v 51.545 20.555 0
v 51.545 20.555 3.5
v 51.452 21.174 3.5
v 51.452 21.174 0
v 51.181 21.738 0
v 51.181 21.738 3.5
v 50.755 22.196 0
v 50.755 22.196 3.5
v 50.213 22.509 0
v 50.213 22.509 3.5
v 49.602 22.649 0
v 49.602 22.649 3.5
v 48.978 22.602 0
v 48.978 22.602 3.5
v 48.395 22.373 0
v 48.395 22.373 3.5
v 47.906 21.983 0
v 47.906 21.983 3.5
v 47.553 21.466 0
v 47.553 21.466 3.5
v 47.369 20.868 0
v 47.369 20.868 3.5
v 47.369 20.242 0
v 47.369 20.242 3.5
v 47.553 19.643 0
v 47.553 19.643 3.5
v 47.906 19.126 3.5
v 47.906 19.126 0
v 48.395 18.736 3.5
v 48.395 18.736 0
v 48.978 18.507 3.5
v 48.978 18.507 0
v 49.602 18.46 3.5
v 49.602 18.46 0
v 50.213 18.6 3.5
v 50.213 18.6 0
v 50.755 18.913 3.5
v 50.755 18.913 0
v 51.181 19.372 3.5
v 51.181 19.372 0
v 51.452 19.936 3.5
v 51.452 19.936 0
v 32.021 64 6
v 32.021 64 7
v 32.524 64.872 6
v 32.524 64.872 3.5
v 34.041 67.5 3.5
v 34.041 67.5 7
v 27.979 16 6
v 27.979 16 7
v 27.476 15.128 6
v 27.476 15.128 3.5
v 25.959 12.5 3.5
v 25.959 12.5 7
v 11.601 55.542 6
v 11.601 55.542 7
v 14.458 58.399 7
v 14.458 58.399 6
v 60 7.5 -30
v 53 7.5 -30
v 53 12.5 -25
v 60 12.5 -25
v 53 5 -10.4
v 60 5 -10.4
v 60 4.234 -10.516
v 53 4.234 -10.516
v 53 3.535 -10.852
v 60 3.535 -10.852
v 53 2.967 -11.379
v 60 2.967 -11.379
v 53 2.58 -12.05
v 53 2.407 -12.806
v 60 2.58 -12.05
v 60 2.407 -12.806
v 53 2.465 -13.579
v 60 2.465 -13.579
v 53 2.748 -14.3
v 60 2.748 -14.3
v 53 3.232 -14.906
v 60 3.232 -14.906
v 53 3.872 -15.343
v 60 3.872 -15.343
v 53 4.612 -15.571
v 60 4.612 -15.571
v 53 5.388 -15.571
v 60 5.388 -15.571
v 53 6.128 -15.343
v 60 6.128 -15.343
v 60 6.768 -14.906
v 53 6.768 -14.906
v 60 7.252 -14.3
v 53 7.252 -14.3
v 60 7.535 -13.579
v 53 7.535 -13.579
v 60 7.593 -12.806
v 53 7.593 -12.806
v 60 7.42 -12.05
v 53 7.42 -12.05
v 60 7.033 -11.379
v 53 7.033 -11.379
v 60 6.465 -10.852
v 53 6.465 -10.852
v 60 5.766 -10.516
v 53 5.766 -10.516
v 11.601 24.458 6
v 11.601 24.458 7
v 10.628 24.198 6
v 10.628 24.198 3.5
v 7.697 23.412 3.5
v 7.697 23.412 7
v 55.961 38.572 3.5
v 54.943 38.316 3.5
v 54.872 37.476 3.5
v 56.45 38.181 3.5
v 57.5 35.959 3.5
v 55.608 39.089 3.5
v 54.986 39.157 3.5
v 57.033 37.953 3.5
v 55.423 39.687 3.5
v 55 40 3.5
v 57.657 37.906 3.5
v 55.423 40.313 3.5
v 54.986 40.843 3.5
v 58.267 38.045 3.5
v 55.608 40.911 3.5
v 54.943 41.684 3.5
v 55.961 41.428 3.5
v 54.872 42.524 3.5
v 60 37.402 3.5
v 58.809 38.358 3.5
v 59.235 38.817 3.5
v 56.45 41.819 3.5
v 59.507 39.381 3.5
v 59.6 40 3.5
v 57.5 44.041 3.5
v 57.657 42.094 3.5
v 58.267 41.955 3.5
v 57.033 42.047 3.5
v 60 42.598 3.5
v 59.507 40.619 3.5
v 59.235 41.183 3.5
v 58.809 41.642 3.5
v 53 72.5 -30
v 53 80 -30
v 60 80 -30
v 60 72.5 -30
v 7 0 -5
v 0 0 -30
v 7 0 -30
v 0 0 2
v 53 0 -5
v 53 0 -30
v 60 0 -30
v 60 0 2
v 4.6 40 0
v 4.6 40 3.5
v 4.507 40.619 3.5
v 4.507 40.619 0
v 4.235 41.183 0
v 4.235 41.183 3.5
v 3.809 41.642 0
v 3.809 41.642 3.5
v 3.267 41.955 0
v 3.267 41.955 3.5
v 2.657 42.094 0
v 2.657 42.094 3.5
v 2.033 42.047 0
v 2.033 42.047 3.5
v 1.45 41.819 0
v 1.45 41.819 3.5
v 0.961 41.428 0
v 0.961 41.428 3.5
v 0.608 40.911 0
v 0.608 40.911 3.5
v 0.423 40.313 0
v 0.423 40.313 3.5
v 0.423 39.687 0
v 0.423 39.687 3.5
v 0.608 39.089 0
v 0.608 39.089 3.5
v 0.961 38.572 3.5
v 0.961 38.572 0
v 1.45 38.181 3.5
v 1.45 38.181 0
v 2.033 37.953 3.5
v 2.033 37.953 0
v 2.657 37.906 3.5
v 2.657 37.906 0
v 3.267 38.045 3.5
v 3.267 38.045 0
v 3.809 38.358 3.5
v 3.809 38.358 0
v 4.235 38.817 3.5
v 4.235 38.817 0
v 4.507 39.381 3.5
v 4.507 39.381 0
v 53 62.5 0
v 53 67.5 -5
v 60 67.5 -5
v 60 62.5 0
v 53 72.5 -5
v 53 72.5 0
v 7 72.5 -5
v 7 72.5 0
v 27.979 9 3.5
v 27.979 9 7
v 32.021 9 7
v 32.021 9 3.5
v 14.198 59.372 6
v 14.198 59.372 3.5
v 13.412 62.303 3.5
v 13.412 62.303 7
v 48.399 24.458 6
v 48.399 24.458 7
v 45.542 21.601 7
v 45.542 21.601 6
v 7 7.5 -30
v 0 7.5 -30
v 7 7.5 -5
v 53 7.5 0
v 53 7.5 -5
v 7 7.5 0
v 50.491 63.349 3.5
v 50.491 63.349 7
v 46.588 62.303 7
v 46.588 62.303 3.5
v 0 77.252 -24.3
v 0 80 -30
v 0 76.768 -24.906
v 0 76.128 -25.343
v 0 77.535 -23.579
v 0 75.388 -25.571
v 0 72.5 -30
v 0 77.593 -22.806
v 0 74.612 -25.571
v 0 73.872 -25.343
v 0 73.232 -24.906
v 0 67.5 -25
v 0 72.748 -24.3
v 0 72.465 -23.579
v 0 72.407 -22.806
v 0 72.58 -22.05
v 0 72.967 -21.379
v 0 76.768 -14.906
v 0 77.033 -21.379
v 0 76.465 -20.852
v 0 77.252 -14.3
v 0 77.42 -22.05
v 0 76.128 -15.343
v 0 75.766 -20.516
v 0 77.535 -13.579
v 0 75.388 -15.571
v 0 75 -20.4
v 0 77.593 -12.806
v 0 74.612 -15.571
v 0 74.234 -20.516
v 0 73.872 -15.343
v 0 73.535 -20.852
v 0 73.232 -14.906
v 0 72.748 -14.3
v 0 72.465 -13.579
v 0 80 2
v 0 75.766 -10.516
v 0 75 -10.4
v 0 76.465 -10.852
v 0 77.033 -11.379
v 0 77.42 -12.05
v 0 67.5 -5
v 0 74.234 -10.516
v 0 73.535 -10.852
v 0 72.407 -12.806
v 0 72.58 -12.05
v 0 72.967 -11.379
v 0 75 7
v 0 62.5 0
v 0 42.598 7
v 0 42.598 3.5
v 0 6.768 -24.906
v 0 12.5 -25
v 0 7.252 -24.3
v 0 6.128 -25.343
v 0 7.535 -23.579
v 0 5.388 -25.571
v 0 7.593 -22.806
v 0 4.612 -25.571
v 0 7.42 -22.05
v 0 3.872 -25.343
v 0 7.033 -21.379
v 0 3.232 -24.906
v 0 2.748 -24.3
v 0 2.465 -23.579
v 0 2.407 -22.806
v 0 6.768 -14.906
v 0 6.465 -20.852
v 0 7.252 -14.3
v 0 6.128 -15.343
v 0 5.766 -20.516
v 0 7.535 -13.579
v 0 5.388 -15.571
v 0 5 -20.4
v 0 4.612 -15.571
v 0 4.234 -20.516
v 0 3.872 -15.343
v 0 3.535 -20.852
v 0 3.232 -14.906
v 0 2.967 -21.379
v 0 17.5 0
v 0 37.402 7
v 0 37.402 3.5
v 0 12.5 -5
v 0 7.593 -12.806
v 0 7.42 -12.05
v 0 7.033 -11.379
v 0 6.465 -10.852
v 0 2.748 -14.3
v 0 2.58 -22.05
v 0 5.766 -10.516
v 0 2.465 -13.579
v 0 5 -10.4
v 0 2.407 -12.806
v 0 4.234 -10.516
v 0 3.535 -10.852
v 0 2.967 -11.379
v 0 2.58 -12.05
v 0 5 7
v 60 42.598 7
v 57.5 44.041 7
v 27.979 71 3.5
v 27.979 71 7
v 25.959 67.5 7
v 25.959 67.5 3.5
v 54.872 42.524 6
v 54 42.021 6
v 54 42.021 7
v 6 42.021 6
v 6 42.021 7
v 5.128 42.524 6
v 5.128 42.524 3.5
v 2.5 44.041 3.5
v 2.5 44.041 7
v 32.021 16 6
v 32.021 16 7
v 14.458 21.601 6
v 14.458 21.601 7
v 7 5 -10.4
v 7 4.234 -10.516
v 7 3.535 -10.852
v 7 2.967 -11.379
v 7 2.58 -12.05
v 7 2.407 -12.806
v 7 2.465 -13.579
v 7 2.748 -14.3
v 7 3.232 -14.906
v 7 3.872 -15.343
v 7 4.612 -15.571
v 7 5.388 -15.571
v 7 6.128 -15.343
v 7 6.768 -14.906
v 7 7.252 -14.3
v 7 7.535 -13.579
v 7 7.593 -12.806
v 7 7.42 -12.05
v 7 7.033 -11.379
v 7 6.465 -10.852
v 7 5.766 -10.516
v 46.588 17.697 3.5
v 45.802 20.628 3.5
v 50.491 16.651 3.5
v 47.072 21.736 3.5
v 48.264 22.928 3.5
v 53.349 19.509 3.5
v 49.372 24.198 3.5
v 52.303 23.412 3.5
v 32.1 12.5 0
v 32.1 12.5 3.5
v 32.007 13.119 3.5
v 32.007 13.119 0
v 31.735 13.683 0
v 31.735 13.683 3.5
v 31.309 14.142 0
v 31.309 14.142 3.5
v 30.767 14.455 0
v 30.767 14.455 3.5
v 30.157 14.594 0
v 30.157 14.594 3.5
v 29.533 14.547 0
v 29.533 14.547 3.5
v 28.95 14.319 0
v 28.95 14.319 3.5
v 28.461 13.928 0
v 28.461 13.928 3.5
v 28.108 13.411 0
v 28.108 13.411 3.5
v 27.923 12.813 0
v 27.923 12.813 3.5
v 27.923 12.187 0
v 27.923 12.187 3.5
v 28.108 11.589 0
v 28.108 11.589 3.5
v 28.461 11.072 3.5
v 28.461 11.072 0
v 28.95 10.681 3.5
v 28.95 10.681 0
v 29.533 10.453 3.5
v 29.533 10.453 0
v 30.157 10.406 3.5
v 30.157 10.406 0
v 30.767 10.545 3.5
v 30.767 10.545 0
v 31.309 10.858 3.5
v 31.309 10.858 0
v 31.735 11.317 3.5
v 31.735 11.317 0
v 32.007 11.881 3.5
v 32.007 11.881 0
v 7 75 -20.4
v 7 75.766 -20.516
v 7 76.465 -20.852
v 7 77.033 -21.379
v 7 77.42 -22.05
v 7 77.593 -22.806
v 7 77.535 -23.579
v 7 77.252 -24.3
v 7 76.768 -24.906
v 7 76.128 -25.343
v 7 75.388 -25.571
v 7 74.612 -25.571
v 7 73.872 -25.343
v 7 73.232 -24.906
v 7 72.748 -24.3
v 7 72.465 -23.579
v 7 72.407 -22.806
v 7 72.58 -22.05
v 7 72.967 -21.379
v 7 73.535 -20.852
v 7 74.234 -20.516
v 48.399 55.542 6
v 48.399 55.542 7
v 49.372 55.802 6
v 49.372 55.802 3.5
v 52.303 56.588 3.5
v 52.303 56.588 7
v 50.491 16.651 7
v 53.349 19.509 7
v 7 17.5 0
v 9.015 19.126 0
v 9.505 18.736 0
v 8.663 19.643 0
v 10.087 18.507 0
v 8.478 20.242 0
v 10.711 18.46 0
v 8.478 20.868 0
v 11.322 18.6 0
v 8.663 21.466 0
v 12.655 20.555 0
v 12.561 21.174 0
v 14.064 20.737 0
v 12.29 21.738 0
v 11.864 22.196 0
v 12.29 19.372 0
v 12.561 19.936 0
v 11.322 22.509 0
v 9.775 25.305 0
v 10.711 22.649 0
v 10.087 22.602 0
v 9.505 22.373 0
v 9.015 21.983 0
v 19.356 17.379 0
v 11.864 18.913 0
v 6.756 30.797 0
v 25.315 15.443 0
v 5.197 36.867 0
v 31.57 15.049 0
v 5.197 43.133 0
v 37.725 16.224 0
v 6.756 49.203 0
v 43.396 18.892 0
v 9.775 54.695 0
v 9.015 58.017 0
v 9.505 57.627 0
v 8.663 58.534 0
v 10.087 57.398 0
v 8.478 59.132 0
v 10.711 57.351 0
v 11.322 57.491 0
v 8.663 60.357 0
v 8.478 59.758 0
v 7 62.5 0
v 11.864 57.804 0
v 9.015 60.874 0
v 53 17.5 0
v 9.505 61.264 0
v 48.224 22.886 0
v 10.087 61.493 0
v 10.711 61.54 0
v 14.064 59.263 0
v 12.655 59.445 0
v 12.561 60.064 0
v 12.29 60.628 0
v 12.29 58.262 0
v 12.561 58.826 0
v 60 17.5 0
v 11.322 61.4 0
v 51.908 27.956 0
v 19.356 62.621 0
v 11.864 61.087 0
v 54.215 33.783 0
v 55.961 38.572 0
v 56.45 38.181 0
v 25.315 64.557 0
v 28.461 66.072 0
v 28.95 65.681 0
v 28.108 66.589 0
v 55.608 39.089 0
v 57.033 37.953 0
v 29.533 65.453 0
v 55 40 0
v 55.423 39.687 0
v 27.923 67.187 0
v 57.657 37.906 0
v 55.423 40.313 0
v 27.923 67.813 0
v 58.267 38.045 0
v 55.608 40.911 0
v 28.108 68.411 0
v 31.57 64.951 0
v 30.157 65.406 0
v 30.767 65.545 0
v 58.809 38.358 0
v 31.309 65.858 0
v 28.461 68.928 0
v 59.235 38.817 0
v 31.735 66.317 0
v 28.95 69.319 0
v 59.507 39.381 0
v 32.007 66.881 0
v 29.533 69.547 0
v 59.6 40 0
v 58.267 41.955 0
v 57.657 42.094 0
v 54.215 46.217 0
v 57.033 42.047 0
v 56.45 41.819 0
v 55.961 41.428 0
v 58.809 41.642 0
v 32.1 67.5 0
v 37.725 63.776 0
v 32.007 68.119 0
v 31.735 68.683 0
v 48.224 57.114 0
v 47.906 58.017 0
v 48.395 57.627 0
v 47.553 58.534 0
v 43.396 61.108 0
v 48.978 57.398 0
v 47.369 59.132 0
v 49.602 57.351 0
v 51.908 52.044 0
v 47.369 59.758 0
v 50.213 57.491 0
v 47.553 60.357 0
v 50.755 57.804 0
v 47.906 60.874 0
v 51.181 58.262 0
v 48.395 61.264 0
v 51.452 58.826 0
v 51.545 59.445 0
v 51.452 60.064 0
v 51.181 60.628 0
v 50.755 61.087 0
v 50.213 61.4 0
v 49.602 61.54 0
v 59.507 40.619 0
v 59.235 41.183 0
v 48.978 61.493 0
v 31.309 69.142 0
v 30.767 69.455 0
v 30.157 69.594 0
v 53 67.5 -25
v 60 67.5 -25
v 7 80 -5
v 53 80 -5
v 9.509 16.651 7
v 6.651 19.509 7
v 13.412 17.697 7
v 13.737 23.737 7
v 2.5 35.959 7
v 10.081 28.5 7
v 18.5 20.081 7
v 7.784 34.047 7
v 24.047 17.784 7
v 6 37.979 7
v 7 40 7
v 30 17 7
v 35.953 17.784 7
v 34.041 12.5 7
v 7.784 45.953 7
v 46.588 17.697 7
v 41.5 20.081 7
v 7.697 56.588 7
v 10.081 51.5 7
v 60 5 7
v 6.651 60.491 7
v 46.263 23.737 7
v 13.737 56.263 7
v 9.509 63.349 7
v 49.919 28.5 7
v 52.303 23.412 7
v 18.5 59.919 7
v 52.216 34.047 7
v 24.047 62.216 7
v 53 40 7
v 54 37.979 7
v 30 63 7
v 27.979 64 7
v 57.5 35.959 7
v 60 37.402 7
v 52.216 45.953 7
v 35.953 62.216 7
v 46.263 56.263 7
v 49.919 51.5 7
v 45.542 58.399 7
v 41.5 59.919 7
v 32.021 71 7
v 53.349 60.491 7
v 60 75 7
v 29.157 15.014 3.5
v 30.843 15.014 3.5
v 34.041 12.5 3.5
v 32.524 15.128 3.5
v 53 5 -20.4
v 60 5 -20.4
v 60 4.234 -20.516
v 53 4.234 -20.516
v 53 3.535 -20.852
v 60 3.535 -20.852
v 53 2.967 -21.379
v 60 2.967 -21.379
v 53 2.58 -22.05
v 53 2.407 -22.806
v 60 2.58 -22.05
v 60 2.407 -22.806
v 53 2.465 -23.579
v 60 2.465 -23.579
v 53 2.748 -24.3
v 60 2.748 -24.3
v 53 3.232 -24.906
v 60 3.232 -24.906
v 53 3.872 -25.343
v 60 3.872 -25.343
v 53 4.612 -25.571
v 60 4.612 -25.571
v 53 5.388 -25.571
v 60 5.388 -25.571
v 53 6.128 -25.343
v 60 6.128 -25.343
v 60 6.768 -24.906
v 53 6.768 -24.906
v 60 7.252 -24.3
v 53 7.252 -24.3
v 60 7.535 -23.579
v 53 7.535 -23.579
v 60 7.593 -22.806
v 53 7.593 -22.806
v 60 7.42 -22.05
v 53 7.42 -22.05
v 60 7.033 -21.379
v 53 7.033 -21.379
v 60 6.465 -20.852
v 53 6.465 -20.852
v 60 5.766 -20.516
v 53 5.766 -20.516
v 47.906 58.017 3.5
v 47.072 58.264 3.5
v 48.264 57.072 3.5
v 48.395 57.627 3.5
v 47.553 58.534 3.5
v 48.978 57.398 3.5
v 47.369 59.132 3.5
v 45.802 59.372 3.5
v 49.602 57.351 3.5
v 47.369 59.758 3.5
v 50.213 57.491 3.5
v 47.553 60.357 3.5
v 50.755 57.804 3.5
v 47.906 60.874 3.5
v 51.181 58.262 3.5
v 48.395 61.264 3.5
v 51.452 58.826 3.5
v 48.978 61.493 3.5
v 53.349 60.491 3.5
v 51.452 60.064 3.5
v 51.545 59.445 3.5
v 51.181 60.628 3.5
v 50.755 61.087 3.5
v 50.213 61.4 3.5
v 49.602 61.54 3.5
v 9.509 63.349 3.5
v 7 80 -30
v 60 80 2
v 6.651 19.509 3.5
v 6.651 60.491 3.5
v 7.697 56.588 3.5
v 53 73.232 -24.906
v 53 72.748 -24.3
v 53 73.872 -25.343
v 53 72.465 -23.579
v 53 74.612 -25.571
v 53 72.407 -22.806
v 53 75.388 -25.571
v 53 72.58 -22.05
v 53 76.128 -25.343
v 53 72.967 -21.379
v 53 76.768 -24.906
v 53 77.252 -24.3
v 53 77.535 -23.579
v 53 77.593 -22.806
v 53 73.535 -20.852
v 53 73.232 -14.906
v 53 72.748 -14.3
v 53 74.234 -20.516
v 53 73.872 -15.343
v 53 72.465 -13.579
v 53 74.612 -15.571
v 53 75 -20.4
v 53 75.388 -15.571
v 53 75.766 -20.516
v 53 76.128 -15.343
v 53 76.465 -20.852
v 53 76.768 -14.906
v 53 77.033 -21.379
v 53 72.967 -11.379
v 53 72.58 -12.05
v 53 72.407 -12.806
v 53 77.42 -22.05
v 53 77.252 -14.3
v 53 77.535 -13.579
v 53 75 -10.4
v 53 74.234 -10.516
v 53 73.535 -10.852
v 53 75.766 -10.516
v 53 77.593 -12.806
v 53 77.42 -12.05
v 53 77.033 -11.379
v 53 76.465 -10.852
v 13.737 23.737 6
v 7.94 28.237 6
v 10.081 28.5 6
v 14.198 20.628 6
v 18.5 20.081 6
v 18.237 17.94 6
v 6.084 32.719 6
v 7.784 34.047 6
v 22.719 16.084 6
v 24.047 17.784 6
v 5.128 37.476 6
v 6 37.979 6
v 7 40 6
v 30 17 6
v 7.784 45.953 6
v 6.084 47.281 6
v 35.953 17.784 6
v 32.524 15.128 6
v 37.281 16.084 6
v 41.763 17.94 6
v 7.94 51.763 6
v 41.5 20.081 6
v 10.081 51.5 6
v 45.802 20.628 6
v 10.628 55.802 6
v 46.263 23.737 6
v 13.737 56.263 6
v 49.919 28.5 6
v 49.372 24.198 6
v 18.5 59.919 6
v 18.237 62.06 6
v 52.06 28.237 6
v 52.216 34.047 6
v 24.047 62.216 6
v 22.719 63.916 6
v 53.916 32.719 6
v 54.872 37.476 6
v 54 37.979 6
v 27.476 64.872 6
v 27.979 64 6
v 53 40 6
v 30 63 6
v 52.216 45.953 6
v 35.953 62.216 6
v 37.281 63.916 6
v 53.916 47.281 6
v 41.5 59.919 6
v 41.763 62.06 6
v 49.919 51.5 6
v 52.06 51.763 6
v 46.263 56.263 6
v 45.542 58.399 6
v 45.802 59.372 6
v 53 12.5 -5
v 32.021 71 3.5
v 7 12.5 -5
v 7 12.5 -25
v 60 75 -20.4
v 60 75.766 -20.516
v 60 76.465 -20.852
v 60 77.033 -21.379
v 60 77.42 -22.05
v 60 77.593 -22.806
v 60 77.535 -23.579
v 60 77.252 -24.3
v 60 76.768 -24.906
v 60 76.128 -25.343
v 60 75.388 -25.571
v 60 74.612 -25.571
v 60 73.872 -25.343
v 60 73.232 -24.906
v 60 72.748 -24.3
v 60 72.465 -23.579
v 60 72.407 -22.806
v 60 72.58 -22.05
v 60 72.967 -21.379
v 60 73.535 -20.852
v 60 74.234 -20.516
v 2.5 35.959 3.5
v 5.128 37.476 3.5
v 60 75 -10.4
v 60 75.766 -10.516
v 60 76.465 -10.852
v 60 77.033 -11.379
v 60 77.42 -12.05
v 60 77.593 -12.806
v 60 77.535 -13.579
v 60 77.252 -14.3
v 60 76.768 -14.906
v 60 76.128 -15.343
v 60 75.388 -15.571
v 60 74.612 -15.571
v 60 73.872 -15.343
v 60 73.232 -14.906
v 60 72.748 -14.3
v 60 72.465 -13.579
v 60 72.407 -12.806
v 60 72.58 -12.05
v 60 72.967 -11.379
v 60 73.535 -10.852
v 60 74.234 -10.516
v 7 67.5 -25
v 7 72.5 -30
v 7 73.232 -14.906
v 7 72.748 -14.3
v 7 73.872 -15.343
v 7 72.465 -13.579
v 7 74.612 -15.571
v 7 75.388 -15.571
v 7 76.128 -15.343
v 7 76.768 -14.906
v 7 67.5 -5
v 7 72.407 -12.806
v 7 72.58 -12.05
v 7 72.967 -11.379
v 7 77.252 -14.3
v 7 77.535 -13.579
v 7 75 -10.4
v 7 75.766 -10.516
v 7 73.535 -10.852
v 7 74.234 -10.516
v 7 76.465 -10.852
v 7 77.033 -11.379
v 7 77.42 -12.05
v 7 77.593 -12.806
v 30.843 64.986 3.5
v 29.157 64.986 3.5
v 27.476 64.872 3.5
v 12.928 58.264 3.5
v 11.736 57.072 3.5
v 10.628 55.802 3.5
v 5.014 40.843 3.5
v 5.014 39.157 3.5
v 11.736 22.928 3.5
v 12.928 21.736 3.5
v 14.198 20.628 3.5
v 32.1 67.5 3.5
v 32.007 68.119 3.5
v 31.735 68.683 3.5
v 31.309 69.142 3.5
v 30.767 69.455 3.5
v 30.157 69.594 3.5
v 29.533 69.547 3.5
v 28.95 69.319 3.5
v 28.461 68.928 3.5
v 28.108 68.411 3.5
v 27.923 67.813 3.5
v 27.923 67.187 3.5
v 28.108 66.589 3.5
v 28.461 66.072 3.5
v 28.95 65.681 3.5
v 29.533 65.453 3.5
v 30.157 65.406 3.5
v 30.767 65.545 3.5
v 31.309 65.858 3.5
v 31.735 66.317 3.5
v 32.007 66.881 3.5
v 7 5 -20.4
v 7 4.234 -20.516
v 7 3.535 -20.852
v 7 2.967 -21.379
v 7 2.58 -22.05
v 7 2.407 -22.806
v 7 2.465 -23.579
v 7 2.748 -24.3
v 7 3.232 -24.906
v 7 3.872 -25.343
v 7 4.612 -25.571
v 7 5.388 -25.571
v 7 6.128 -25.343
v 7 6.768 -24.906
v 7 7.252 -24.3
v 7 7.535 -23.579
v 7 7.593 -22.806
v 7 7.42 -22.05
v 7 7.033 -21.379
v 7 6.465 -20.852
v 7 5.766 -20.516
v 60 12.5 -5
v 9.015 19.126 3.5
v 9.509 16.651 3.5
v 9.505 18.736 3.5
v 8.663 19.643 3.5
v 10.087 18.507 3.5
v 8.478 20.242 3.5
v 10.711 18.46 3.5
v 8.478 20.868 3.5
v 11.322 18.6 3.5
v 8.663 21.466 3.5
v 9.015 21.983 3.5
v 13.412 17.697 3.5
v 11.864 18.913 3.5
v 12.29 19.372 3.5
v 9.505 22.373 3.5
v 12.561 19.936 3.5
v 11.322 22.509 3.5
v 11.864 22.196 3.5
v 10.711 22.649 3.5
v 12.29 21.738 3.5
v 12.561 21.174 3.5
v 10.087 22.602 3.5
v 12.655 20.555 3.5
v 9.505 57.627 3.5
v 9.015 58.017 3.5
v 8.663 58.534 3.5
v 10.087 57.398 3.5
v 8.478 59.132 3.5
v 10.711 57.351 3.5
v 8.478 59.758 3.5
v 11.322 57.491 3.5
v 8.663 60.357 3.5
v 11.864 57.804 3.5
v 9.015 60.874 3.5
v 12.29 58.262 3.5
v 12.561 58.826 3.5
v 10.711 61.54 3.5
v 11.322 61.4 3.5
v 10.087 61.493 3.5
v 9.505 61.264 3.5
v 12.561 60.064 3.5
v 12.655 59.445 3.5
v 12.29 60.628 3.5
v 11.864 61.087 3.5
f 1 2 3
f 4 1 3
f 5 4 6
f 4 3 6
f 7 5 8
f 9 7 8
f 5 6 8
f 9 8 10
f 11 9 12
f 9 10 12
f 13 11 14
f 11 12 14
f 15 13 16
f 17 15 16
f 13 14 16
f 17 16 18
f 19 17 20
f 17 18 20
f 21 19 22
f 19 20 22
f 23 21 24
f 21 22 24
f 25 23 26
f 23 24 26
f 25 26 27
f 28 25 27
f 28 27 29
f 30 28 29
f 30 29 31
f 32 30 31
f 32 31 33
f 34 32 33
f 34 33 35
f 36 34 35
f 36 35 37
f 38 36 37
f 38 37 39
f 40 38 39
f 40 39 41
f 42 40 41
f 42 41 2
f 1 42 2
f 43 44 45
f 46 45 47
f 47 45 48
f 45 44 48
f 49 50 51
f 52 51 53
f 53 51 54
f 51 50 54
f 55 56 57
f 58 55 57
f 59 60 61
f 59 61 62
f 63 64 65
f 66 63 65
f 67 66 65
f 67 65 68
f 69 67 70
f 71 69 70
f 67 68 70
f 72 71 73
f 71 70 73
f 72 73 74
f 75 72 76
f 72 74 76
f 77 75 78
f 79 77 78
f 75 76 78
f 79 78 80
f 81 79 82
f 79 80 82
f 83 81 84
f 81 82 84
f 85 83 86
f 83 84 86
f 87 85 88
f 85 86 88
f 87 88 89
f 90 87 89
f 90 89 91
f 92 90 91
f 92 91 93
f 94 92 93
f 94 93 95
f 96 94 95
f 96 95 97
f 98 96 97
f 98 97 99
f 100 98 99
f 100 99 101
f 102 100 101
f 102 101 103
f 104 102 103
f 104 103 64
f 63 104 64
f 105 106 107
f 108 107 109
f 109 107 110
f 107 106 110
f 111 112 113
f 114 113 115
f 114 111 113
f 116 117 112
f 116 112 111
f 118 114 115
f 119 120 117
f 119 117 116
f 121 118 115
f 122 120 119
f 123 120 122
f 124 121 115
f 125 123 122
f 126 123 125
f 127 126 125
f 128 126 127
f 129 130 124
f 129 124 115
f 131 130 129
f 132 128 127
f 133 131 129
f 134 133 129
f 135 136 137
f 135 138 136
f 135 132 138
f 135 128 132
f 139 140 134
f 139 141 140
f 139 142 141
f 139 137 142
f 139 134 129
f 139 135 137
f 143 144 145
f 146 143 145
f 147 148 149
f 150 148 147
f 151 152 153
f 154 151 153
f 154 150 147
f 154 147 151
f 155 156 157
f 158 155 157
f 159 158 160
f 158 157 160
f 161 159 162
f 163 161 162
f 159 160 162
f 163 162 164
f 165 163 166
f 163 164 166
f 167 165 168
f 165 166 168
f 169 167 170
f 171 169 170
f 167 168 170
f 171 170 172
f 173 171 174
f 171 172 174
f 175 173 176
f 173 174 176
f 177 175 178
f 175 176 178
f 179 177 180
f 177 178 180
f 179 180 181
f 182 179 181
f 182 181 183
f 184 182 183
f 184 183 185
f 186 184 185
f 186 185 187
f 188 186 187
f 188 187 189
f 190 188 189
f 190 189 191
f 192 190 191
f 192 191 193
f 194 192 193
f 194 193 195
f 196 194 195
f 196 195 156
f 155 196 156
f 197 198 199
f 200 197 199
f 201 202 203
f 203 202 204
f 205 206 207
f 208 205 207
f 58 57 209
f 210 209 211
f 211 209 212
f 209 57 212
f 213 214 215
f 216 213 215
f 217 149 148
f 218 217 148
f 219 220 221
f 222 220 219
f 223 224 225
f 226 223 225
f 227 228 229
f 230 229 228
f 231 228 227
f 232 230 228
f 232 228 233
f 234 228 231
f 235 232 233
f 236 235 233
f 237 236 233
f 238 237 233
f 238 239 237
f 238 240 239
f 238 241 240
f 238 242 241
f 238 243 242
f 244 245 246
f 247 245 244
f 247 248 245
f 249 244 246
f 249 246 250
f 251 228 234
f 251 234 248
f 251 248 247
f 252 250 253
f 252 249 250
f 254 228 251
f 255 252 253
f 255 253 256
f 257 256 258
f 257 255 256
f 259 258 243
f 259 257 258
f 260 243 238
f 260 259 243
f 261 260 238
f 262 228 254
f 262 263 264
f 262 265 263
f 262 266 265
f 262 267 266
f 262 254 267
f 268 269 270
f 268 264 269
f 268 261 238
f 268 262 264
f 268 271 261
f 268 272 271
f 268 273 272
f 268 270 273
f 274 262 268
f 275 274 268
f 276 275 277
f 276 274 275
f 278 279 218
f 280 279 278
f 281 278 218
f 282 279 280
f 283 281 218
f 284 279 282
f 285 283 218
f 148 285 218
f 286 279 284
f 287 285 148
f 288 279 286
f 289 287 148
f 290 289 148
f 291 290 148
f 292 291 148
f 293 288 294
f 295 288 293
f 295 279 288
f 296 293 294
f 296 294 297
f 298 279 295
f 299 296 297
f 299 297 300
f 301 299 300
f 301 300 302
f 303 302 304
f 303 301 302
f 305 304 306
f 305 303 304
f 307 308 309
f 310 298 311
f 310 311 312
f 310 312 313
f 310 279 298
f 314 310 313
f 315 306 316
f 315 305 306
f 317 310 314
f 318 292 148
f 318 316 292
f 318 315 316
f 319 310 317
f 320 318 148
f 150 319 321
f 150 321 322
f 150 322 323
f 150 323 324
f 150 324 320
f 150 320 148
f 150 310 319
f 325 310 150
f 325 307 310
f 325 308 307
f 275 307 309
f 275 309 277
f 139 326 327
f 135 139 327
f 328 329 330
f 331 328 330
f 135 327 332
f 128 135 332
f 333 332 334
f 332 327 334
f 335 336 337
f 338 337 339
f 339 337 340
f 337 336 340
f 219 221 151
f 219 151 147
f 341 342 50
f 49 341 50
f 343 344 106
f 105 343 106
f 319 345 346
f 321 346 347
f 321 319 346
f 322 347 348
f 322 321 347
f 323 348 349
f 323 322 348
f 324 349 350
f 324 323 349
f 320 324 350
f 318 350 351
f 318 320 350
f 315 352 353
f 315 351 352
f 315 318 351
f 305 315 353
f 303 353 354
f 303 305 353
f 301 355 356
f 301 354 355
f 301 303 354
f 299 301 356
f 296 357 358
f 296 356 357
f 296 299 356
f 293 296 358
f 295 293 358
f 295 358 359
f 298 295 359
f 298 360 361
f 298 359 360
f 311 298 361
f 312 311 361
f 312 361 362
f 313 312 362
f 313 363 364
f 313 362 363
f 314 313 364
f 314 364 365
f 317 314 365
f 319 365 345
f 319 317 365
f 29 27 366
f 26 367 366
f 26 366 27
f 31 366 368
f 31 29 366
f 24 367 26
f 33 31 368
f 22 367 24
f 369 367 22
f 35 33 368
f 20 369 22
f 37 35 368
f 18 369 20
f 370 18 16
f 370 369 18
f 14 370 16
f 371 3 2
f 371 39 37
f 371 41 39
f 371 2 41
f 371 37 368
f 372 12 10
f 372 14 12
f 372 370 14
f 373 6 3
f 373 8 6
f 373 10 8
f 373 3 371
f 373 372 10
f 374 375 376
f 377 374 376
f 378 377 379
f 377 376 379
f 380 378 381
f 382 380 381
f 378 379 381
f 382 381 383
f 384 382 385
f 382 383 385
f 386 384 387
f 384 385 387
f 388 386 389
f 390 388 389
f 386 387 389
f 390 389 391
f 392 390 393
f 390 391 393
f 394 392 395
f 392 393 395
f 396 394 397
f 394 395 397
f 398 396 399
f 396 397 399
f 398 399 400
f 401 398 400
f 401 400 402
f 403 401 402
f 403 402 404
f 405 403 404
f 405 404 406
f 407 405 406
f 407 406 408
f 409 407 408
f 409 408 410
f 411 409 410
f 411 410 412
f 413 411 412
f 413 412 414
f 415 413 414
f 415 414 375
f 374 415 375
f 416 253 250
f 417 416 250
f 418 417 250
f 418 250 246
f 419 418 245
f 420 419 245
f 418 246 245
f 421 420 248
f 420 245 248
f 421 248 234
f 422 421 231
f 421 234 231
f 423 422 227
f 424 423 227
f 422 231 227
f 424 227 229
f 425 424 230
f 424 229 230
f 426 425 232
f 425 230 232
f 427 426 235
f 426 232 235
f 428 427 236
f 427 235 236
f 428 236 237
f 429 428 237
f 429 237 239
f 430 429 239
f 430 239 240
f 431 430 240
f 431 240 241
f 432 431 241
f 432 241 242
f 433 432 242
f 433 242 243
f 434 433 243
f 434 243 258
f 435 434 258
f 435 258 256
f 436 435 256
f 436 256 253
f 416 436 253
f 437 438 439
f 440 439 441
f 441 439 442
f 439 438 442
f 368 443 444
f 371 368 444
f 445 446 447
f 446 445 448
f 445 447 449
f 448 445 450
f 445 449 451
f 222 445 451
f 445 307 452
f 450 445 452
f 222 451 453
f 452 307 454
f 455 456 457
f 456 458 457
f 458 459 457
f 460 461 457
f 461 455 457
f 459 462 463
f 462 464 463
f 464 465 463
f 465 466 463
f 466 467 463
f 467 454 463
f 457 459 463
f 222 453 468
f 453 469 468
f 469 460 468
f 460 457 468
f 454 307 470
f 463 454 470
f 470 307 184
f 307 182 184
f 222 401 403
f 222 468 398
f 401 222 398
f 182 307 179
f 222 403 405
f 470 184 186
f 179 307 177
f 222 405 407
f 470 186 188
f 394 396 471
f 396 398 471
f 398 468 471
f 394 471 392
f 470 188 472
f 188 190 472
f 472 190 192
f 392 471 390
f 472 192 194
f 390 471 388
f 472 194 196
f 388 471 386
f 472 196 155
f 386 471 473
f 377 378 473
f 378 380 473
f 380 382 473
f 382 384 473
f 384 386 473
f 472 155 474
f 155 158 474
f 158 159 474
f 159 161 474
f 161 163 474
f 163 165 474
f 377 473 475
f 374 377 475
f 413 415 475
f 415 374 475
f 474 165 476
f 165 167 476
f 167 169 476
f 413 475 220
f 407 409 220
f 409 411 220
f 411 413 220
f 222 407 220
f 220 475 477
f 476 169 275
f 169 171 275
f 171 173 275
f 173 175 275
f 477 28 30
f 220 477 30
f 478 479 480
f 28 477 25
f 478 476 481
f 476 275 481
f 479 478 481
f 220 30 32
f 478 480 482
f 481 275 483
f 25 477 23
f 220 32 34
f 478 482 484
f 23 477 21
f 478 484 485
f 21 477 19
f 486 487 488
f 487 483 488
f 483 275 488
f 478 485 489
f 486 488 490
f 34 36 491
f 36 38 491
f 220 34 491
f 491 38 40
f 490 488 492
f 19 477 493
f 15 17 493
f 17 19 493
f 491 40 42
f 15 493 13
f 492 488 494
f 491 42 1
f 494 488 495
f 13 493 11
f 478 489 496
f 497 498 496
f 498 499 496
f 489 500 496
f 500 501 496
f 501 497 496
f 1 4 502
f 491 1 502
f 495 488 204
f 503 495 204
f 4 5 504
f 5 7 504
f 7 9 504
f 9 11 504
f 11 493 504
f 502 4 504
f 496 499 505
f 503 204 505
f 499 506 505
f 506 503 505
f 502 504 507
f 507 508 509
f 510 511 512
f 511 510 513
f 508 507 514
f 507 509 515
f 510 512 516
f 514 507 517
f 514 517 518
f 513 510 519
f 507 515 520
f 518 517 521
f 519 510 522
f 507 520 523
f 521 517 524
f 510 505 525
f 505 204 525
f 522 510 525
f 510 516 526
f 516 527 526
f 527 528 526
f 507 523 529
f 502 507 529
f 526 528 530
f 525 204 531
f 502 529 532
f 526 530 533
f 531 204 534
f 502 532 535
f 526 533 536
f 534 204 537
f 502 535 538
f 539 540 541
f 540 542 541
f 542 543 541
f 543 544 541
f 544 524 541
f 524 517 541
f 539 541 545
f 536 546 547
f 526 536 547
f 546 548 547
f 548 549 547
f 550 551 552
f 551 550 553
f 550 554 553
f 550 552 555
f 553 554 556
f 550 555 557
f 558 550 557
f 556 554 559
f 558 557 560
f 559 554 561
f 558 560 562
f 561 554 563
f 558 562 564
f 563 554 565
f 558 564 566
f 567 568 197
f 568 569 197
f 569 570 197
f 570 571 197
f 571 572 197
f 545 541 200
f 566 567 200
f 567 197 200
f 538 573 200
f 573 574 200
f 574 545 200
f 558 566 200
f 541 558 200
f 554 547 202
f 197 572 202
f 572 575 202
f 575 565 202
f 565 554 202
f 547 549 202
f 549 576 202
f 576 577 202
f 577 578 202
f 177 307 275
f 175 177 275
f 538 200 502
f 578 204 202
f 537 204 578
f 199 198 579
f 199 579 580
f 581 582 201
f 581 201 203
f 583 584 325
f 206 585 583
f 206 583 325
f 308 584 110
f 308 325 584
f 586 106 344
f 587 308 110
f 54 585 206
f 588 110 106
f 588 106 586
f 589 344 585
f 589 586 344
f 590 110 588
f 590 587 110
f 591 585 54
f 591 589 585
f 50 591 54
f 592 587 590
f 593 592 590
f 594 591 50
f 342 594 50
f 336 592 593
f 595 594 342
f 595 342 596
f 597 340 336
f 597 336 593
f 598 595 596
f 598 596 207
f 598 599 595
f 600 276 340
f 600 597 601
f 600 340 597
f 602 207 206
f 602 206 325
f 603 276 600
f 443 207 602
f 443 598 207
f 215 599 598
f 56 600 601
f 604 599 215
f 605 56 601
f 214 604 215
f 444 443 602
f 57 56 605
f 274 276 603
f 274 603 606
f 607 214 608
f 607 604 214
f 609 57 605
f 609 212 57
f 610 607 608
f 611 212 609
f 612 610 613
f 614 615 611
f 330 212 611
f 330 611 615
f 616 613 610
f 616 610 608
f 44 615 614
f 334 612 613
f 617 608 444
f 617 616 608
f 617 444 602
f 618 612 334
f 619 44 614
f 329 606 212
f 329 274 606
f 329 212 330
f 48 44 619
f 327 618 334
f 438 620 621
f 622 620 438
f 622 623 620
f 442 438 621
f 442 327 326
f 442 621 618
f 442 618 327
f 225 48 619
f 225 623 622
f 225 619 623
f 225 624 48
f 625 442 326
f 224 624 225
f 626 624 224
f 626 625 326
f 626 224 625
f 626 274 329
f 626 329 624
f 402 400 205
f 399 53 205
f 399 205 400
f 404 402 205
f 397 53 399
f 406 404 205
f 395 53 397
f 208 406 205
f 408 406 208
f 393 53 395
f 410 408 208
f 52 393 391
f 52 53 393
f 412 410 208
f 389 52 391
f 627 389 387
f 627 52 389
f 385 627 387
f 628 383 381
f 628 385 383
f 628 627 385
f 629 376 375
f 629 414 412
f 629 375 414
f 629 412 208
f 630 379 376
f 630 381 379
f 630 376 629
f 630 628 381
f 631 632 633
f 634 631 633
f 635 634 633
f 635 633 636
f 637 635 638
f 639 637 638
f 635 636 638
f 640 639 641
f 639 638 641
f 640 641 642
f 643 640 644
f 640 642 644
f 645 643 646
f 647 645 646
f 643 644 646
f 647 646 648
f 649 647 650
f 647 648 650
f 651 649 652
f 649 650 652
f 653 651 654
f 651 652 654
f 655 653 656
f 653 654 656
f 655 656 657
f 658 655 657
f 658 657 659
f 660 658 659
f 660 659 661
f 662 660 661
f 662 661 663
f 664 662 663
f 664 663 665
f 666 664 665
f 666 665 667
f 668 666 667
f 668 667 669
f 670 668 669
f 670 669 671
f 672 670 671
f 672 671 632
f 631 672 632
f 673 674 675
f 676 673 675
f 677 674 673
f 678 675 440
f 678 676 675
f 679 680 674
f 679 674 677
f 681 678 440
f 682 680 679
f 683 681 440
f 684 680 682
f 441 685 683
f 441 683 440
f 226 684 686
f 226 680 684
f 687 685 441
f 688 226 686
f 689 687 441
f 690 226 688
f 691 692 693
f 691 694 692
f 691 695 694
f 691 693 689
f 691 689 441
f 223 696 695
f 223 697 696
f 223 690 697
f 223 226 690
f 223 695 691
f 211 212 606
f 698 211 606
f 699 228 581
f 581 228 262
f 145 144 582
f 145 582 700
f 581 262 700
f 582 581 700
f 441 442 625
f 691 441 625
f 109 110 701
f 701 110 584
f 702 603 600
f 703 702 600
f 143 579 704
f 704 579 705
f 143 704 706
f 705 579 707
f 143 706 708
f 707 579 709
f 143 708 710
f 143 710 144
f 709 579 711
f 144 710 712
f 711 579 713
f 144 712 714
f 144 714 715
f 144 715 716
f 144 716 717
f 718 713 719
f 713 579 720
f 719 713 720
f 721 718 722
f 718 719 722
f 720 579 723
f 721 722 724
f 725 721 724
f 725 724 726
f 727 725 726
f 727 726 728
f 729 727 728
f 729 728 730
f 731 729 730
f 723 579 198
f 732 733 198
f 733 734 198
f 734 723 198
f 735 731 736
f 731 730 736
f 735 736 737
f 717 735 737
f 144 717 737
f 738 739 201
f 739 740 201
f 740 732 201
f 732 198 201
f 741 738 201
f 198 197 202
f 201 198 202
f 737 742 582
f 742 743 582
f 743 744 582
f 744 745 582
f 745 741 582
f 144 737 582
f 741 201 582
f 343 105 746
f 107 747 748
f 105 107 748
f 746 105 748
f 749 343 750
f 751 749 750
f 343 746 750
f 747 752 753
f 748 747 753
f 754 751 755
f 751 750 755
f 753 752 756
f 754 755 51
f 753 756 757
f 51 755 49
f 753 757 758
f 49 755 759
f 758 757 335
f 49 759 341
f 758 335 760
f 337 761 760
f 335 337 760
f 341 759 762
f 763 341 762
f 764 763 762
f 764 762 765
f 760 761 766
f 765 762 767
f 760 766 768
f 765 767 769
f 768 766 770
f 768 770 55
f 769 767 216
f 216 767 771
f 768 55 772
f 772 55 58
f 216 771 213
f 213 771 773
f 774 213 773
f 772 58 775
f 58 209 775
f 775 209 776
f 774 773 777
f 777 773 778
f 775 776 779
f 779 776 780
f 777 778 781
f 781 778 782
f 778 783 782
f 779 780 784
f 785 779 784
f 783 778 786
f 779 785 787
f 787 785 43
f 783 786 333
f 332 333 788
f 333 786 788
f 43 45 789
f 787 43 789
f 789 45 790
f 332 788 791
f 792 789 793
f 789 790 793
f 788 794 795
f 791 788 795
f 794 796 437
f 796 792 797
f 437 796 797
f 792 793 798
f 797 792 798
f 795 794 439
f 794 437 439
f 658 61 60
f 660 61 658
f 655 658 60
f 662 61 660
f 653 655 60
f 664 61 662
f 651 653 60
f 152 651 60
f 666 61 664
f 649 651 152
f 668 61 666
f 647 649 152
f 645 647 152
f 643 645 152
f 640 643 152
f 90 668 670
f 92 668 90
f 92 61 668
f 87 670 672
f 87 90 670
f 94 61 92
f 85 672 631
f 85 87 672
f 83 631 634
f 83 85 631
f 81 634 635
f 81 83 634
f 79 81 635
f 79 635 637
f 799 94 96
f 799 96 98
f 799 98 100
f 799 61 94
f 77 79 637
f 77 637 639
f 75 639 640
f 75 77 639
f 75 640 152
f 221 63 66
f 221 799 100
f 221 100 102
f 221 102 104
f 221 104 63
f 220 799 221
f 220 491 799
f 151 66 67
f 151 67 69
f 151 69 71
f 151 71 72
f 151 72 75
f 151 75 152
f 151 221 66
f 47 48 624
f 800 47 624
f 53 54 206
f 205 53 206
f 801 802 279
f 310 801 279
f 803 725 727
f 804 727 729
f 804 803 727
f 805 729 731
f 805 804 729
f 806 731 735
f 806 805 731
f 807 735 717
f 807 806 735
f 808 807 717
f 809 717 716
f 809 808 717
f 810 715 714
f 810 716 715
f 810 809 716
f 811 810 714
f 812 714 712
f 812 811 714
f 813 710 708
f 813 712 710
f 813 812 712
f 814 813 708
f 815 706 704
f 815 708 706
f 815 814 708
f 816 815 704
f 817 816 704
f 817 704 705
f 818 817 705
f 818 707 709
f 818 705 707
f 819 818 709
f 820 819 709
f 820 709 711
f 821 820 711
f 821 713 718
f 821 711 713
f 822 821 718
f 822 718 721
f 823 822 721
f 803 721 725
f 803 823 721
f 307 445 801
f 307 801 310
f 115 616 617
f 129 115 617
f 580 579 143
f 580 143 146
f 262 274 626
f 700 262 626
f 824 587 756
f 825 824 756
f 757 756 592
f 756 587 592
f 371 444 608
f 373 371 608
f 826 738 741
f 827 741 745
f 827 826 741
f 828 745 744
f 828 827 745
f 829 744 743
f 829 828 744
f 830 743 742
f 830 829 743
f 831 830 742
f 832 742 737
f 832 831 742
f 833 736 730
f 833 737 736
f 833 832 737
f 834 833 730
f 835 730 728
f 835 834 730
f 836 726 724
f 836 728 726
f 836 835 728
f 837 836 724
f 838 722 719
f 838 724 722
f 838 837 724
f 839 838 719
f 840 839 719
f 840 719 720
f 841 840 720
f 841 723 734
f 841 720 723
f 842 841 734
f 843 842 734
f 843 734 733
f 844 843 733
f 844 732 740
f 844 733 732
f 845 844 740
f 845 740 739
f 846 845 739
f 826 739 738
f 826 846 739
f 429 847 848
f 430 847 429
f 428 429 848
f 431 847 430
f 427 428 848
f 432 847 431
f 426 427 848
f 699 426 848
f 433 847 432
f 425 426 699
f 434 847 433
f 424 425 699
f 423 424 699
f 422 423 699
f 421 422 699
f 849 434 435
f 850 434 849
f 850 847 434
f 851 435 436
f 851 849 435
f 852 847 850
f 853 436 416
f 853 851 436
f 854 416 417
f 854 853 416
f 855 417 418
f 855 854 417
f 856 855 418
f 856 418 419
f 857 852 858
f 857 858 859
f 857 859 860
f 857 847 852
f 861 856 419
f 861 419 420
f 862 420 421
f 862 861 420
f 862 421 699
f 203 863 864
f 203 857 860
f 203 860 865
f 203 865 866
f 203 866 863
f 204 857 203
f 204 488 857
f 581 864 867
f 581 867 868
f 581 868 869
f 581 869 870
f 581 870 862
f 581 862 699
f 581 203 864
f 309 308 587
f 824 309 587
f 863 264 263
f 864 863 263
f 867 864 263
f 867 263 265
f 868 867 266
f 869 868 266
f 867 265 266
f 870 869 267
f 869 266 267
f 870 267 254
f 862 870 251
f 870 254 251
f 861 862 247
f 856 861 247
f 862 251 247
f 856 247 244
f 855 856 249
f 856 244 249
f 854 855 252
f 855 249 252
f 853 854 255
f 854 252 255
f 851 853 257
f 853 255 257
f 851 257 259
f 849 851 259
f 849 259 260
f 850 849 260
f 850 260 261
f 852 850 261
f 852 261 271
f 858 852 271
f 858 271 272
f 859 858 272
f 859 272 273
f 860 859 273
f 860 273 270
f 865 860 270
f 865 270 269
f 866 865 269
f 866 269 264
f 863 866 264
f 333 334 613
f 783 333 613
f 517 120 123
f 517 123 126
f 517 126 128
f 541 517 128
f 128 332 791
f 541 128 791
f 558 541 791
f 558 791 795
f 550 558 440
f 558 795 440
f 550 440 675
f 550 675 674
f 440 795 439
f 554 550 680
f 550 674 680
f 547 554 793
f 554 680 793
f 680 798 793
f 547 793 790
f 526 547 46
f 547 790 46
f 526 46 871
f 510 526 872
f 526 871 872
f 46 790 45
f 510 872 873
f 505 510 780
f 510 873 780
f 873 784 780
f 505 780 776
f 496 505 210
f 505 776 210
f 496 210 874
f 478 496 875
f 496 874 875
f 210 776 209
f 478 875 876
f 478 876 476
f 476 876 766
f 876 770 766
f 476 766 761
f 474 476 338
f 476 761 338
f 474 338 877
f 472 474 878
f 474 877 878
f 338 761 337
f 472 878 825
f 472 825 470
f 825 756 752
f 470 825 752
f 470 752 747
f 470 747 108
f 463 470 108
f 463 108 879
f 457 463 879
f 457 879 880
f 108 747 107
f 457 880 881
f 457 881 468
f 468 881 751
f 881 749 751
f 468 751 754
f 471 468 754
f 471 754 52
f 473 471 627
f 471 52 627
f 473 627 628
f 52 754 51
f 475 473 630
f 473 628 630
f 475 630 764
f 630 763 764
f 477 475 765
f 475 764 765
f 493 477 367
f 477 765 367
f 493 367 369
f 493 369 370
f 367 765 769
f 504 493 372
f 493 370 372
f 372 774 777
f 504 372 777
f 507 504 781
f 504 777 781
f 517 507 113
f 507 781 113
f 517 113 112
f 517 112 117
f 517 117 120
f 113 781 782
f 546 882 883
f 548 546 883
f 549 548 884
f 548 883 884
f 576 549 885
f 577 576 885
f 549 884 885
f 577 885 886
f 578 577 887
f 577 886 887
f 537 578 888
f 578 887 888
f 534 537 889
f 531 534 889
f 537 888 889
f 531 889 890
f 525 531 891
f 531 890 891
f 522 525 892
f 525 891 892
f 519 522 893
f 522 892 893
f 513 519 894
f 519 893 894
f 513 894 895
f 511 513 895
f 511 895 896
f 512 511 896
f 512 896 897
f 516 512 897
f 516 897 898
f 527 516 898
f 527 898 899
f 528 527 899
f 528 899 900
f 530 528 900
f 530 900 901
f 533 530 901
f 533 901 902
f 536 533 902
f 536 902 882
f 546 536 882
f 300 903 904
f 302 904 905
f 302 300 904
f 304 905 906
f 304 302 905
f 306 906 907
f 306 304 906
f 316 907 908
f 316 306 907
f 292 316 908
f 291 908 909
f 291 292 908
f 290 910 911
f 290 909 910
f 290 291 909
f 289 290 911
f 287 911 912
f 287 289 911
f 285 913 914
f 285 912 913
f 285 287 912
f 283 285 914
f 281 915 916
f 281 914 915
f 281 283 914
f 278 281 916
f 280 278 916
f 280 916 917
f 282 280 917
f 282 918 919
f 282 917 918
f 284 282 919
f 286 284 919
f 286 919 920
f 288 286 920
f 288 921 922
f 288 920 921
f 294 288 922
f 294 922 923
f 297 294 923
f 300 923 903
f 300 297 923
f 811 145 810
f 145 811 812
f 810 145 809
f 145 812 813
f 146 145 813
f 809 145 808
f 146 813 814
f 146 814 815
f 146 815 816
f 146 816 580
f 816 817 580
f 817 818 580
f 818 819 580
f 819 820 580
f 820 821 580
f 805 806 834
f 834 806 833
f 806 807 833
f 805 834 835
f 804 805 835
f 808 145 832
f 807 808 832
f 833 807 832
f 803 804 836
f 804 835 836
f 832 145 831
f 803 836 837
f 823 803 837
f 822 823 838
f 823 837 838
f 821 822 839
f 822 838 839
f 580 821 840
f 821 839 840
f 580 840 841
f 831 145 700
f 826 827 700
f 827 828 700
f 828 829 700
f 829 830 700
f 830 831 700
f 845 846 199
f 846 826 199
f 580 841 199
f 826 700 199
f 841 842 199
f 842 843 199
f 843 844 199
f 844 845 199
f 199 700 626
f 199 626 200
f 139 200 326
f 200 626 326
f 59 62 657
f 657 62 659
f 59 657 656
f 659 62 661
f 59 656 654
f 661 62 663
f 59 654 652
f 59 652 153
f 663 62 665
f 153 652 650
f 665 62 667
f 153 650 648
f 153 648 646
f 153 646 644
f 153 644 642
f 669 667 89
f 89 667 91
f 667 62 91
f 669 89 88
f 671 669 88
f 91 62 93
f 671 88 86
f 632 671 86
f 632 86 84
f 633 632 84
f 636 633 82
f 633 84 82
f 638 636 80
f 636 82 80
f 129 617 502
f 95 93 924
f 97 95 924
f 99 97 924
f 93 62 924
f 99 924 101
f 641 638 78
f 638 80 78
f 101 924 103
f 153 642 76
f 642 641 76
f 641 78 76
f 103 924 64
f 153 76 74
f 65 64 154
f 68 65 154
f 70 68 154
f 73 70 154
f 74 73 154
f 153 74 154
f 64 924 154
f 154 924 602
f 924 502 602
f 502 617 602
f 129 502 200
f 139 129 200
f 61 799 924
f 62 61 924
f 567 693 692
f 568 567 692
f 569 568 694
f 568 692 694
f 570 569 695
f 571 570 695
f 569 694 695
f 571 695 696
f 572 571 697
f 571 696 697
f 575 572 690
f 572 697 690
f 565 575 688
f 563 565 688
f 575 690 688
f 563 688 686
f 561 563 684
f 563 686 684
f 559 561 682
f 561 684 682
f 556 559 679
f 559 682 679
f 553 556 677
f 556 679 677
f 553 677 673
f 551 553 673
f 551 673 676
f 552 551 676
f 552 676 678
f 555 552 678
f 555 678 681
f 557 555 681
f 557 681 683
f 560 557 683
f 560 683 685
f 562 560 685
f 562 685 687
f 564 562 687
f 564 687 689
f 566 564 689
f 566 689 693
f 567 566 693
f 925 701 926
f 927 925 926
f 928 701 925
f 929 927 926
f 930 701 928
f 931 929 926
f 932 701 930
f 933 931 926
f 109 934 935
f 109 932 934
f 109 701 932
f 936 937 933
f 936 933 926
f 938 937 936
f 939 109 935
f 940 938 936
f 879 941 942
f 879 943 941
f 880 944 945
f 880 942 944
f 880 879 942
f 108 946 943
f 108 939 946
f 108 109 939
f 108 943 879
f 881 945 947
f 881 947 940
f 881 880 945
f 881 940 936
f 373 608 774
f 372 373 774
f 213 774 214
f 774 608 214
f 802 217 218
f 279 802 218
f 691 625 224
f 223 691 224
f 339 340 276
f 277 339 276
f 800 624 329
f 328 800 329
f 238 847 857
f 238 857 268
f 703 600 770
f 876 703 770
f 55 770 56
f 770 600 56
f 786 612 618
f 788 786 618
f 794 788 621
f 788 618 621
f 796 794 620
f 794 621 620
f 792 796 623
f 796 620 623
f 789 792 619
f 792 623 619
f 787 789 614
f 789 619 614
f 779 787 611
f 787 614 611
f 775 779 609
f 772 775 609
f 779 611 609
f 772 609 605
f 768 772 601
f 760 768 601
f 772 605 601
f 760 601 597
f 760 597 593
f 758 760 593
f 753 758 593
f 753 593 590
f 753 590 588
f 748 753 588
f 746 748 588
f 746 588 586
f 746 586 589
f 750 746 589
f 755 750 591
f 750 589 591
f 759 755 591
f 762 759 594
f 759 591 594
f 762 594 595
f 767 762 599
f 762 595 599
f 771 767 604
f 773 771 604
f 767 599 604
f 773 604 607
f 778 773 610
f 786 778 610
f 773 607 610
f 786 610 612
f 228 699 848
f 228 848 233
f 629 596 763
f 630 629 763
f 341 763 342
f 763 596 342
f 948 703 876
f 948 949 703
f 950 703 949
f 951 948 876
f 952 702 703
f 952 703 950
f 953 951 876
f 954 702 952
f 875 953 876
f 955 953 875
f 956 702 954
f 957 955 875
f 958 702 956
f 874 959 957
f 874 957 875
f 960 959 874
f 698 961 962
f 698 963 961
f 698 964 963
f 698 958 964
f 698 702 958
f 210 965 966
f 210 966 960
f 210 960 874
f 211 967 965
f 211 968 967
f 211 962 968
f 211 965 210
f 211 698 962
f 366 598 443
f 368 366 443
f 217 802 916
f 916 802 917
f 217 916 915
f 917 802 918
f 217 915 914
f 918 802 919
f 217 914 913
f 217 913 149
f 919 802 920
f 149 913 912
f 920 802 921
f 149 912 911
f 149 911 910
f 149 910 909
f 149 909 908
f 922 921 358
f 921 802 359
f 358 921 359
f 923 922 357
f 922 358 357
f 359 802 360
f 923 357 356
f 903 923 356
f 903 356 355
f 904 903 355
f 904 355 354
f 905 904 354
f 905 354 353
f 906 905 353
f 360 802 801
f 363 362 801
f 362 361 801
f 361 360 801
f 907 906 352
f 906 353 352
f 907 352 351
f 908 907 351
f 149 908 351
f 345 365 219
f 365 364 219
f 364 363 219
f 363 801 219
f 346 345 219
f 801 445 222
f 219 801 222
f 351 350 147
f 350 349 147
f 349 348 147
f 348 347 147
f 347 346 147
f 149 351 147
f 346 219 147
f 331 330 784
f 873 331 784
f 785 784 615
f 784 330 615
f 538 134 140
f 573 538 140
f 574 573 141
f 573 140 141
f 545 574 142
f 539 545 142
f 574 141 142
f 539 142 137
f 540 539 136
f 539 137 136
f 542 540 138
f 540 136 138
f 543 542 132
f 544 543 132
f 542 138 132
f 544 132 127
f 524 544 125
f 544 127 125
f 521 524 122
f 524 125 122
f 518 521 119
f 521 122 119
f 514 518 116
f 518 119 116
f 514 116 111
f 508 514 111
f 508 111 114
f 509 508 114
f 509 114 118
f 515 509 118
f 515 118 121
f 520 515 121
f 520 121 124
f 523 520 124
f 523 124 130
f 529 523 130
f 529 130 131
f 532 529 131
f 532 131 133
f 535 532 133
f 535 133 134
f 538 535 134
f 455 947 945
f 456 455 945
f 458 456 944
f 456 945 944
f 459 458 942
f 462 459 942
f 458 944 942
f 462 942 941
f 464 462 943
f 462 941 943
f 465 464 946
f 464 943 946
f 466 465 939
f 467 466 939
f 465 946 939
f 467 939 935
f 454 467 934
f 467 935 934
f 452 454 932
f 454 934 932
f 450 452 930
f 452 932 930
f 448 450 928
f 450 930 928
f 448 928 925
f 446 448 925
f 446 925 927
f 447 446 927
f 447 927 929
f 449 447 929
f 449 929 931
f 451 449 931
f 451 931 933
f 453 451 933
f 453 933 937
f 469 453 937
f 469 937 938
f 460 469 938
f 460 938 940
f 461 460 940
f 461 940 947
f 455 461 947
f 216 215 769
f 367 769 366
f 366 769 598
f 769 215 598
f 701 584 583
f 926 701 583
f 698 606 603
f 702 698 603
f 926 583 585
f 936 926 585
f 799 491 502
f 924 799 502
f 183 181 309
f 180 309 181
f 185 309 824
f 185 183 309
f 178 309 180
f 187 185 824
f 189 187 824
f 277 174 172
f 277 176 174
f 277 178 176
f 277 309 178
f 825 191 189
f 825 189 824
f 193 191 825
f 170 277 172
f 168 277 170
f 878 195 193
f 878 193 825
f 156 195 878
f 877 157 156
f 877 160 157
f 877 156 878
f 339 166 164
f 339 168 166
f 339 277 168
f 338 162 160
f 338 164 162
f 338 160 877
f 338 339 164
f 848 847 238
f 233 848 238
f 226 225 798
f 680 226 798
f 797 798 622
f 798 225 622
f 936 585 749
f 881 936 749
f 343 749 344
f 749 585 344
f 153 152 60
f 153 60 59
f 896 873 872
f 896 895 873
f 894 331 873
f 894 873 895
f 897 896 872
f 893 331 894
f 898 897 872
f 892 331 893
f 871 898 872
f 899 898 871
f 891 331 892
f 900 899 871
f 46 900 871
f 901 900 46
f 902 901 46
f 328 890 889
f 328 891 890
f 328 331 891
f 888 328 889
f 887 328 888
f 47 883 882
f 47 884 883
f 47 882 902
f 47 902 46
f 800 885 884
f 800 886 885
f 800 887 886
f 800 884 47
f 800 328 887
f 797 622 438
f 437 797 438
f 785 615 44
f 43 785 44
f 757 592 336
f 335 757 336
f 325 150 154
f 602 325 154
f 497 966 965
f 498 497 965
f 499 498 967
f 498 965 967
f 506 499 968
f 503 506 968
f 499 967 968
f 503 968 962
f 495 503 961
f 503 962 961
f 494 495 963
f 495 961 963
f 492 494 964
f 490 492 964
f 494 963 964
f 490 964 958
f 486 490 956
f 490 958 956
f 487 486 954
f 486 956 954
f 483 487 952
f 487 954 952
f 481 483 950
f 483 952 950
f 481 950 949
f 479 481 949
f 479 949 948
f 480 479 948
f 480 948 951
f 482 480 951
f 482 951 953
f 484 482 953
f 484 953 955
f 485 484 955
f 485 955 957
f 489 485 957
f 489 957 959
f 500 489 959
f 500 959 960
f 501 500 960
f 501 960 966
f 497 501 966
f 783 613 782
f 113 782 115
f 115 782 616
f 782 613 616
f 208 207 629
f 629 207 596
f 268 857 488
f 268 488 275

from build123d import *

# Parameters (mm, degrees)
SKETCH1_W               = 60
SKETCH1_H               = 80
BOSS_EXTRUDE1_DEPTH     = 7
SKETCH2_W               = 7
SKETCH2_H               = 12.5
BOSS_EXTRUDE2_DEPTH     = 30
SKETCH3_R               = 2.6
CUT_EXTRUDE1_DEPTH      = 50
SKETCH4_R               = 25
CUT_EXTRUDE2_DEPTH      = 107.625512894
SKETCH6_R               = 2.1
CUT_EXTRUDE3_DEPTH      = 107.625512894
MIRROR2_COPY_1_SKETCH_W = 7
MIRROR2_COPY_1_SKETCH_H = 12.5
MIRROR2_COPY_1_DEPTH    = 30
MIRROR2_COPY_2_SKETCH_R = 2.6
MIRROR2_COPY_2_DEPTH    = 50
CHAMFER1_SIZE           = 5
CHAMFER2_SIZE           = 5
SKETCH9_W               = 46
SKETCH9_H               = 7.5
BOSS_EXTRUDE4_DEPTH     = 5
CHAMFER3_SIZE           = 5
SKETCH20_R              = 25
SKETCH20_R_2            = 23
BOSS_EXTRUDE5_DEPTH     = 1
CUT_EXTRUDE5_DEPTH      = 3.5


with BuildPart() as part:
    # Sketch1 → Boss-Extrude1 (new body)
    with BuildSketch(Plane.XY):
        with Locations((30, 40)):
            Rectangle(SKETCH1_W, SKETCH1_H)
    extrude(amount=BOSS_EXTRUDE1_DEPTH)

    # Sketch2 → Boss-Extrude2 (add)
    with BuildSketch(Plane(origin=(0, 0, 0), x_dir=(-1, 0, 0), z_dir=(0, 0, -1))):
        with Locations((-3.5, 73.75)):
            Rectangle(SKETCH2_W, SKETCH2_H)
    boss_extrude2 = extrude(amount=BOSS_EXTRUDE2_DEPTH)

    # Sketch3 → Cut-Extrude1 (cut)
    with BuildSketch(Plane.ZY):
        with Locations((-13, 75)):
            Circle(SKETCH3_R)
        with Locations((-23, 75)):
            Circle(SKETCH3_R)
    cut_extrude1 = extrude(amount=-CUT_EXTRUDE1_DEPTH, mode=Mode.SUBTRACT)

    # Sketch4 → Cut-Extrude2 (cut, through all)
    with BuildSketch(Plane.XY.offset(7)):
        with Locations((30, 40)):
            Circle(SKETCH4_R)
    extrude(amount=-CUT_EXTRUDE2_DEPTH, mode=Mode.SUBTRACT)

    # Sketch6 → Cut-Extrude3 (cut, through all)
    with BuildSketch(Plane.XY.offset(7)):
        with Locations((30, 67.5)):
            Circle(SKETCH6_R)
        with Locations((49.445436483, 59.445436483)):
            Circle(SKETCH6_R)
        with Locations((57.5, 40)):
            Circle(SKETCH6_R)
        with Locations((49.445436483, 20.554563517)):
            Circle(SKETCH6_R)
        with Locations((30, 12.5)):
            Circle(SKETCH6_R)
        with Locations((10.554563517, 20.554563517)):
            Circle(SKETCH6_R)
        with Locations((2.5, 40)):
            Circle(SKETCH6_R)
        with Locations((10.554563517, 59.445436483)):
            Circle(SKETCH6_R)
    extrude(amount=-CUT_EXTRUDE3_DEPTH, mode=Mode.SUBTRACT)

    # Mirror1: Boss-Extrude2, Cut-Extrude1 across plane
    add(boss_extrude2.mirror(Plane(origin=(0, 40, 0), x_dir=(0, 0, 1), z_dir=(0, -1, 0))))
    add(cut_extrude1.mirror(Plane(origin=(0, 40, 0), x_dir=(0, 0, 1), z_dir=(0, -1, 0))), mode=Mode.SUBTRACT)

    # Mirror2: Boss-Extrude2, Cut-Extrude1 across plane
    add(boss_extrude2.mirror(Plane(origin=(30, 0, 0), x_dir=(0, 0, 1), z_dir=(1, 0, 0))))
    add(cut_extrude1.mirror(Plane(origin=(30, 0, 0), x_dir=(0, 0, 1), z_dir=(1, 0, 0))), mode=Mode.SUBTRACT)

    # Mirror2 copy 1 sketch → Mirror2 copy 1 (add)
    with BuildSketch(Plane(origin=(60, 80, 0), x_dir=(1, 0, 0), z_dir=(0, 0, -1))):
        with Locations((-3.5, 73.75)):
            Rectangle(MIRROR2_COPY_1_SKETCH_W, MIRROR2_COPY_1_SKETCH_H)
    extrude(amount=MIRROR2_COPY_1_DEPTH)

    # Mirror2 copy 2 sketch → Mirror2 copy 2 (cut)
    with BuildSketch(Plane(origin=(60, 80, 0), x_dir=(0, 0, 1), z_dir=(1, 0, 0))):
        with Locations((-13, 75)):
            Circle(MIRROR2_COPY_2_SKETCH_R)
        with Locations((-23, 75)):
            Circle(MIRROR2_COPY_2_SKETCH_R)
    extrude(amount=-MIRROR2_COPY_2_DEPTH, mode=Mode.SUBTRACT)

    # Chamfer1
    chamfer1_edges = [part.edges().sort_by_distance(p)[0] for p in [
        (56.5, 67.5, 0),
        (56.5, 12.5, 0),
        (3.5, 67.5, 0),
        (3.5, 12.5, 0),
    ]]
    chamfer(chamfer1_edges, length=CHAMFER1_SIZE)

    # Chamfer2
    chamfer2_edges = [part.edges().sort_by_distance(p)[0] for p in [
        (56.5, 67.5, -30),
        (56.5, 12.5, -30),
        (3.5, 67.5, -30),
        (3.5, 12.5, -30),
    ]]
    chamfer(chamfer2_edges, length=CHAMFER2_SIZE)

    # Sketch9 → Boss-Extrude4 (add)
    with BuildSketch(Plane(origin=(0, 0, 0), x_dir=(-1, 0, 0), z_dir=(0, 0, -1))):
        with Locations((-30, 76.25)):
            Rectangle(SKETCH9_W, SKETCH9_H)
        with Locations((-30, 3.75)):
            Rectangle(SKETCH9_W, SKETCH9_H)
    extrude(amount=BOSS_EXTRUDE4_DEPTH)

    # Chamfer3
    chamfer3_edges = [part.edges().sort_by_distance(p)[0] for p in [
        (30, 80, 7),
        (30, 0, 7),
    ]]
    chamfer(chamfer3_edges, length=CHAMFER3_SIZE)

    # Sketch20 → Boss-Extrude5 (add)
    with BuildSketch(Plane.XY.offset(7)):
        with Locations((30, 40)):
            Circle(SKETCH20_R)
        with Locations((30, 40)):
            Circle(SKETCH20_R_2, mode=Mode.SUBTRACT)
    extrude(amount=-BOSS_EXTRUDE5_DEPTH)

    # Sketch21 → Cut-Extrude5 (cut)
    with BuildSketch(Plane.XY.offset(7)):
        Polygon((52.303174516, 56.587698449), (53.349179233, 60.4914412), (50.4914412, 63.349179233), (46.587698449, 62.303174516), (45.541693732, 58.399431765), (48.399431765, 55.541693732), align=None)
        Polygon((34.041451884, 67.5), (32.020725942, 71), (27.979274058, 71), (25.958548116, 67.5), (27.979274058, 64), (32.020725942, 64), align=None)
        Polygon((57.5, 35.958548116), (61, 37.979274058), (61, 42.020725942), (57.5, 44.041451884), (54, 42.020725942), (54, 37.979274058), align=None)
        Polygon((46.587698449, 17.696825484), (50.4914412, 16.650820767), (53.349179233, 19.5085588), (52.303174516, 23.412301551), (48.399431765, 24.458306268), (45.541693732, 21.600568235), align=None)
        Polygon((25.958548116, 12.5), (27.979274058, 9), (32.020725942, 9), (34.041451884, 12.5), (32.020725942, 16), (27.979274058, 16), align=None)
        Polygon((7.696825484, 23.412301551), (6.650820767, 19.5085588), (9.5085588, 16.650820767), (13.412301551, 17.696825484), (14.458306268, 21.600568235), (11.600568235, 24.458306268), align=None)
        Polygon((2.5, 44.041451884), (-1, 42.020725942), (-1, 37.979274058), (2.5, 35.958548116), (6, 37.979274058), (6, 42.020725942), align=None)
        Polygon((13.412301551, 62.303174516), (9.5085588, 63.349179233), (6.650820767, 60.4914412), (7.696825484, 56.587698449), (11.600568235, 55.541693732), (14.458306268, 58.399431765), align=None)
    extrude(amount=-CUT_EXTRUDE5_DEPTH, mode=Mode.SUBTRACT)


solid = part.part
